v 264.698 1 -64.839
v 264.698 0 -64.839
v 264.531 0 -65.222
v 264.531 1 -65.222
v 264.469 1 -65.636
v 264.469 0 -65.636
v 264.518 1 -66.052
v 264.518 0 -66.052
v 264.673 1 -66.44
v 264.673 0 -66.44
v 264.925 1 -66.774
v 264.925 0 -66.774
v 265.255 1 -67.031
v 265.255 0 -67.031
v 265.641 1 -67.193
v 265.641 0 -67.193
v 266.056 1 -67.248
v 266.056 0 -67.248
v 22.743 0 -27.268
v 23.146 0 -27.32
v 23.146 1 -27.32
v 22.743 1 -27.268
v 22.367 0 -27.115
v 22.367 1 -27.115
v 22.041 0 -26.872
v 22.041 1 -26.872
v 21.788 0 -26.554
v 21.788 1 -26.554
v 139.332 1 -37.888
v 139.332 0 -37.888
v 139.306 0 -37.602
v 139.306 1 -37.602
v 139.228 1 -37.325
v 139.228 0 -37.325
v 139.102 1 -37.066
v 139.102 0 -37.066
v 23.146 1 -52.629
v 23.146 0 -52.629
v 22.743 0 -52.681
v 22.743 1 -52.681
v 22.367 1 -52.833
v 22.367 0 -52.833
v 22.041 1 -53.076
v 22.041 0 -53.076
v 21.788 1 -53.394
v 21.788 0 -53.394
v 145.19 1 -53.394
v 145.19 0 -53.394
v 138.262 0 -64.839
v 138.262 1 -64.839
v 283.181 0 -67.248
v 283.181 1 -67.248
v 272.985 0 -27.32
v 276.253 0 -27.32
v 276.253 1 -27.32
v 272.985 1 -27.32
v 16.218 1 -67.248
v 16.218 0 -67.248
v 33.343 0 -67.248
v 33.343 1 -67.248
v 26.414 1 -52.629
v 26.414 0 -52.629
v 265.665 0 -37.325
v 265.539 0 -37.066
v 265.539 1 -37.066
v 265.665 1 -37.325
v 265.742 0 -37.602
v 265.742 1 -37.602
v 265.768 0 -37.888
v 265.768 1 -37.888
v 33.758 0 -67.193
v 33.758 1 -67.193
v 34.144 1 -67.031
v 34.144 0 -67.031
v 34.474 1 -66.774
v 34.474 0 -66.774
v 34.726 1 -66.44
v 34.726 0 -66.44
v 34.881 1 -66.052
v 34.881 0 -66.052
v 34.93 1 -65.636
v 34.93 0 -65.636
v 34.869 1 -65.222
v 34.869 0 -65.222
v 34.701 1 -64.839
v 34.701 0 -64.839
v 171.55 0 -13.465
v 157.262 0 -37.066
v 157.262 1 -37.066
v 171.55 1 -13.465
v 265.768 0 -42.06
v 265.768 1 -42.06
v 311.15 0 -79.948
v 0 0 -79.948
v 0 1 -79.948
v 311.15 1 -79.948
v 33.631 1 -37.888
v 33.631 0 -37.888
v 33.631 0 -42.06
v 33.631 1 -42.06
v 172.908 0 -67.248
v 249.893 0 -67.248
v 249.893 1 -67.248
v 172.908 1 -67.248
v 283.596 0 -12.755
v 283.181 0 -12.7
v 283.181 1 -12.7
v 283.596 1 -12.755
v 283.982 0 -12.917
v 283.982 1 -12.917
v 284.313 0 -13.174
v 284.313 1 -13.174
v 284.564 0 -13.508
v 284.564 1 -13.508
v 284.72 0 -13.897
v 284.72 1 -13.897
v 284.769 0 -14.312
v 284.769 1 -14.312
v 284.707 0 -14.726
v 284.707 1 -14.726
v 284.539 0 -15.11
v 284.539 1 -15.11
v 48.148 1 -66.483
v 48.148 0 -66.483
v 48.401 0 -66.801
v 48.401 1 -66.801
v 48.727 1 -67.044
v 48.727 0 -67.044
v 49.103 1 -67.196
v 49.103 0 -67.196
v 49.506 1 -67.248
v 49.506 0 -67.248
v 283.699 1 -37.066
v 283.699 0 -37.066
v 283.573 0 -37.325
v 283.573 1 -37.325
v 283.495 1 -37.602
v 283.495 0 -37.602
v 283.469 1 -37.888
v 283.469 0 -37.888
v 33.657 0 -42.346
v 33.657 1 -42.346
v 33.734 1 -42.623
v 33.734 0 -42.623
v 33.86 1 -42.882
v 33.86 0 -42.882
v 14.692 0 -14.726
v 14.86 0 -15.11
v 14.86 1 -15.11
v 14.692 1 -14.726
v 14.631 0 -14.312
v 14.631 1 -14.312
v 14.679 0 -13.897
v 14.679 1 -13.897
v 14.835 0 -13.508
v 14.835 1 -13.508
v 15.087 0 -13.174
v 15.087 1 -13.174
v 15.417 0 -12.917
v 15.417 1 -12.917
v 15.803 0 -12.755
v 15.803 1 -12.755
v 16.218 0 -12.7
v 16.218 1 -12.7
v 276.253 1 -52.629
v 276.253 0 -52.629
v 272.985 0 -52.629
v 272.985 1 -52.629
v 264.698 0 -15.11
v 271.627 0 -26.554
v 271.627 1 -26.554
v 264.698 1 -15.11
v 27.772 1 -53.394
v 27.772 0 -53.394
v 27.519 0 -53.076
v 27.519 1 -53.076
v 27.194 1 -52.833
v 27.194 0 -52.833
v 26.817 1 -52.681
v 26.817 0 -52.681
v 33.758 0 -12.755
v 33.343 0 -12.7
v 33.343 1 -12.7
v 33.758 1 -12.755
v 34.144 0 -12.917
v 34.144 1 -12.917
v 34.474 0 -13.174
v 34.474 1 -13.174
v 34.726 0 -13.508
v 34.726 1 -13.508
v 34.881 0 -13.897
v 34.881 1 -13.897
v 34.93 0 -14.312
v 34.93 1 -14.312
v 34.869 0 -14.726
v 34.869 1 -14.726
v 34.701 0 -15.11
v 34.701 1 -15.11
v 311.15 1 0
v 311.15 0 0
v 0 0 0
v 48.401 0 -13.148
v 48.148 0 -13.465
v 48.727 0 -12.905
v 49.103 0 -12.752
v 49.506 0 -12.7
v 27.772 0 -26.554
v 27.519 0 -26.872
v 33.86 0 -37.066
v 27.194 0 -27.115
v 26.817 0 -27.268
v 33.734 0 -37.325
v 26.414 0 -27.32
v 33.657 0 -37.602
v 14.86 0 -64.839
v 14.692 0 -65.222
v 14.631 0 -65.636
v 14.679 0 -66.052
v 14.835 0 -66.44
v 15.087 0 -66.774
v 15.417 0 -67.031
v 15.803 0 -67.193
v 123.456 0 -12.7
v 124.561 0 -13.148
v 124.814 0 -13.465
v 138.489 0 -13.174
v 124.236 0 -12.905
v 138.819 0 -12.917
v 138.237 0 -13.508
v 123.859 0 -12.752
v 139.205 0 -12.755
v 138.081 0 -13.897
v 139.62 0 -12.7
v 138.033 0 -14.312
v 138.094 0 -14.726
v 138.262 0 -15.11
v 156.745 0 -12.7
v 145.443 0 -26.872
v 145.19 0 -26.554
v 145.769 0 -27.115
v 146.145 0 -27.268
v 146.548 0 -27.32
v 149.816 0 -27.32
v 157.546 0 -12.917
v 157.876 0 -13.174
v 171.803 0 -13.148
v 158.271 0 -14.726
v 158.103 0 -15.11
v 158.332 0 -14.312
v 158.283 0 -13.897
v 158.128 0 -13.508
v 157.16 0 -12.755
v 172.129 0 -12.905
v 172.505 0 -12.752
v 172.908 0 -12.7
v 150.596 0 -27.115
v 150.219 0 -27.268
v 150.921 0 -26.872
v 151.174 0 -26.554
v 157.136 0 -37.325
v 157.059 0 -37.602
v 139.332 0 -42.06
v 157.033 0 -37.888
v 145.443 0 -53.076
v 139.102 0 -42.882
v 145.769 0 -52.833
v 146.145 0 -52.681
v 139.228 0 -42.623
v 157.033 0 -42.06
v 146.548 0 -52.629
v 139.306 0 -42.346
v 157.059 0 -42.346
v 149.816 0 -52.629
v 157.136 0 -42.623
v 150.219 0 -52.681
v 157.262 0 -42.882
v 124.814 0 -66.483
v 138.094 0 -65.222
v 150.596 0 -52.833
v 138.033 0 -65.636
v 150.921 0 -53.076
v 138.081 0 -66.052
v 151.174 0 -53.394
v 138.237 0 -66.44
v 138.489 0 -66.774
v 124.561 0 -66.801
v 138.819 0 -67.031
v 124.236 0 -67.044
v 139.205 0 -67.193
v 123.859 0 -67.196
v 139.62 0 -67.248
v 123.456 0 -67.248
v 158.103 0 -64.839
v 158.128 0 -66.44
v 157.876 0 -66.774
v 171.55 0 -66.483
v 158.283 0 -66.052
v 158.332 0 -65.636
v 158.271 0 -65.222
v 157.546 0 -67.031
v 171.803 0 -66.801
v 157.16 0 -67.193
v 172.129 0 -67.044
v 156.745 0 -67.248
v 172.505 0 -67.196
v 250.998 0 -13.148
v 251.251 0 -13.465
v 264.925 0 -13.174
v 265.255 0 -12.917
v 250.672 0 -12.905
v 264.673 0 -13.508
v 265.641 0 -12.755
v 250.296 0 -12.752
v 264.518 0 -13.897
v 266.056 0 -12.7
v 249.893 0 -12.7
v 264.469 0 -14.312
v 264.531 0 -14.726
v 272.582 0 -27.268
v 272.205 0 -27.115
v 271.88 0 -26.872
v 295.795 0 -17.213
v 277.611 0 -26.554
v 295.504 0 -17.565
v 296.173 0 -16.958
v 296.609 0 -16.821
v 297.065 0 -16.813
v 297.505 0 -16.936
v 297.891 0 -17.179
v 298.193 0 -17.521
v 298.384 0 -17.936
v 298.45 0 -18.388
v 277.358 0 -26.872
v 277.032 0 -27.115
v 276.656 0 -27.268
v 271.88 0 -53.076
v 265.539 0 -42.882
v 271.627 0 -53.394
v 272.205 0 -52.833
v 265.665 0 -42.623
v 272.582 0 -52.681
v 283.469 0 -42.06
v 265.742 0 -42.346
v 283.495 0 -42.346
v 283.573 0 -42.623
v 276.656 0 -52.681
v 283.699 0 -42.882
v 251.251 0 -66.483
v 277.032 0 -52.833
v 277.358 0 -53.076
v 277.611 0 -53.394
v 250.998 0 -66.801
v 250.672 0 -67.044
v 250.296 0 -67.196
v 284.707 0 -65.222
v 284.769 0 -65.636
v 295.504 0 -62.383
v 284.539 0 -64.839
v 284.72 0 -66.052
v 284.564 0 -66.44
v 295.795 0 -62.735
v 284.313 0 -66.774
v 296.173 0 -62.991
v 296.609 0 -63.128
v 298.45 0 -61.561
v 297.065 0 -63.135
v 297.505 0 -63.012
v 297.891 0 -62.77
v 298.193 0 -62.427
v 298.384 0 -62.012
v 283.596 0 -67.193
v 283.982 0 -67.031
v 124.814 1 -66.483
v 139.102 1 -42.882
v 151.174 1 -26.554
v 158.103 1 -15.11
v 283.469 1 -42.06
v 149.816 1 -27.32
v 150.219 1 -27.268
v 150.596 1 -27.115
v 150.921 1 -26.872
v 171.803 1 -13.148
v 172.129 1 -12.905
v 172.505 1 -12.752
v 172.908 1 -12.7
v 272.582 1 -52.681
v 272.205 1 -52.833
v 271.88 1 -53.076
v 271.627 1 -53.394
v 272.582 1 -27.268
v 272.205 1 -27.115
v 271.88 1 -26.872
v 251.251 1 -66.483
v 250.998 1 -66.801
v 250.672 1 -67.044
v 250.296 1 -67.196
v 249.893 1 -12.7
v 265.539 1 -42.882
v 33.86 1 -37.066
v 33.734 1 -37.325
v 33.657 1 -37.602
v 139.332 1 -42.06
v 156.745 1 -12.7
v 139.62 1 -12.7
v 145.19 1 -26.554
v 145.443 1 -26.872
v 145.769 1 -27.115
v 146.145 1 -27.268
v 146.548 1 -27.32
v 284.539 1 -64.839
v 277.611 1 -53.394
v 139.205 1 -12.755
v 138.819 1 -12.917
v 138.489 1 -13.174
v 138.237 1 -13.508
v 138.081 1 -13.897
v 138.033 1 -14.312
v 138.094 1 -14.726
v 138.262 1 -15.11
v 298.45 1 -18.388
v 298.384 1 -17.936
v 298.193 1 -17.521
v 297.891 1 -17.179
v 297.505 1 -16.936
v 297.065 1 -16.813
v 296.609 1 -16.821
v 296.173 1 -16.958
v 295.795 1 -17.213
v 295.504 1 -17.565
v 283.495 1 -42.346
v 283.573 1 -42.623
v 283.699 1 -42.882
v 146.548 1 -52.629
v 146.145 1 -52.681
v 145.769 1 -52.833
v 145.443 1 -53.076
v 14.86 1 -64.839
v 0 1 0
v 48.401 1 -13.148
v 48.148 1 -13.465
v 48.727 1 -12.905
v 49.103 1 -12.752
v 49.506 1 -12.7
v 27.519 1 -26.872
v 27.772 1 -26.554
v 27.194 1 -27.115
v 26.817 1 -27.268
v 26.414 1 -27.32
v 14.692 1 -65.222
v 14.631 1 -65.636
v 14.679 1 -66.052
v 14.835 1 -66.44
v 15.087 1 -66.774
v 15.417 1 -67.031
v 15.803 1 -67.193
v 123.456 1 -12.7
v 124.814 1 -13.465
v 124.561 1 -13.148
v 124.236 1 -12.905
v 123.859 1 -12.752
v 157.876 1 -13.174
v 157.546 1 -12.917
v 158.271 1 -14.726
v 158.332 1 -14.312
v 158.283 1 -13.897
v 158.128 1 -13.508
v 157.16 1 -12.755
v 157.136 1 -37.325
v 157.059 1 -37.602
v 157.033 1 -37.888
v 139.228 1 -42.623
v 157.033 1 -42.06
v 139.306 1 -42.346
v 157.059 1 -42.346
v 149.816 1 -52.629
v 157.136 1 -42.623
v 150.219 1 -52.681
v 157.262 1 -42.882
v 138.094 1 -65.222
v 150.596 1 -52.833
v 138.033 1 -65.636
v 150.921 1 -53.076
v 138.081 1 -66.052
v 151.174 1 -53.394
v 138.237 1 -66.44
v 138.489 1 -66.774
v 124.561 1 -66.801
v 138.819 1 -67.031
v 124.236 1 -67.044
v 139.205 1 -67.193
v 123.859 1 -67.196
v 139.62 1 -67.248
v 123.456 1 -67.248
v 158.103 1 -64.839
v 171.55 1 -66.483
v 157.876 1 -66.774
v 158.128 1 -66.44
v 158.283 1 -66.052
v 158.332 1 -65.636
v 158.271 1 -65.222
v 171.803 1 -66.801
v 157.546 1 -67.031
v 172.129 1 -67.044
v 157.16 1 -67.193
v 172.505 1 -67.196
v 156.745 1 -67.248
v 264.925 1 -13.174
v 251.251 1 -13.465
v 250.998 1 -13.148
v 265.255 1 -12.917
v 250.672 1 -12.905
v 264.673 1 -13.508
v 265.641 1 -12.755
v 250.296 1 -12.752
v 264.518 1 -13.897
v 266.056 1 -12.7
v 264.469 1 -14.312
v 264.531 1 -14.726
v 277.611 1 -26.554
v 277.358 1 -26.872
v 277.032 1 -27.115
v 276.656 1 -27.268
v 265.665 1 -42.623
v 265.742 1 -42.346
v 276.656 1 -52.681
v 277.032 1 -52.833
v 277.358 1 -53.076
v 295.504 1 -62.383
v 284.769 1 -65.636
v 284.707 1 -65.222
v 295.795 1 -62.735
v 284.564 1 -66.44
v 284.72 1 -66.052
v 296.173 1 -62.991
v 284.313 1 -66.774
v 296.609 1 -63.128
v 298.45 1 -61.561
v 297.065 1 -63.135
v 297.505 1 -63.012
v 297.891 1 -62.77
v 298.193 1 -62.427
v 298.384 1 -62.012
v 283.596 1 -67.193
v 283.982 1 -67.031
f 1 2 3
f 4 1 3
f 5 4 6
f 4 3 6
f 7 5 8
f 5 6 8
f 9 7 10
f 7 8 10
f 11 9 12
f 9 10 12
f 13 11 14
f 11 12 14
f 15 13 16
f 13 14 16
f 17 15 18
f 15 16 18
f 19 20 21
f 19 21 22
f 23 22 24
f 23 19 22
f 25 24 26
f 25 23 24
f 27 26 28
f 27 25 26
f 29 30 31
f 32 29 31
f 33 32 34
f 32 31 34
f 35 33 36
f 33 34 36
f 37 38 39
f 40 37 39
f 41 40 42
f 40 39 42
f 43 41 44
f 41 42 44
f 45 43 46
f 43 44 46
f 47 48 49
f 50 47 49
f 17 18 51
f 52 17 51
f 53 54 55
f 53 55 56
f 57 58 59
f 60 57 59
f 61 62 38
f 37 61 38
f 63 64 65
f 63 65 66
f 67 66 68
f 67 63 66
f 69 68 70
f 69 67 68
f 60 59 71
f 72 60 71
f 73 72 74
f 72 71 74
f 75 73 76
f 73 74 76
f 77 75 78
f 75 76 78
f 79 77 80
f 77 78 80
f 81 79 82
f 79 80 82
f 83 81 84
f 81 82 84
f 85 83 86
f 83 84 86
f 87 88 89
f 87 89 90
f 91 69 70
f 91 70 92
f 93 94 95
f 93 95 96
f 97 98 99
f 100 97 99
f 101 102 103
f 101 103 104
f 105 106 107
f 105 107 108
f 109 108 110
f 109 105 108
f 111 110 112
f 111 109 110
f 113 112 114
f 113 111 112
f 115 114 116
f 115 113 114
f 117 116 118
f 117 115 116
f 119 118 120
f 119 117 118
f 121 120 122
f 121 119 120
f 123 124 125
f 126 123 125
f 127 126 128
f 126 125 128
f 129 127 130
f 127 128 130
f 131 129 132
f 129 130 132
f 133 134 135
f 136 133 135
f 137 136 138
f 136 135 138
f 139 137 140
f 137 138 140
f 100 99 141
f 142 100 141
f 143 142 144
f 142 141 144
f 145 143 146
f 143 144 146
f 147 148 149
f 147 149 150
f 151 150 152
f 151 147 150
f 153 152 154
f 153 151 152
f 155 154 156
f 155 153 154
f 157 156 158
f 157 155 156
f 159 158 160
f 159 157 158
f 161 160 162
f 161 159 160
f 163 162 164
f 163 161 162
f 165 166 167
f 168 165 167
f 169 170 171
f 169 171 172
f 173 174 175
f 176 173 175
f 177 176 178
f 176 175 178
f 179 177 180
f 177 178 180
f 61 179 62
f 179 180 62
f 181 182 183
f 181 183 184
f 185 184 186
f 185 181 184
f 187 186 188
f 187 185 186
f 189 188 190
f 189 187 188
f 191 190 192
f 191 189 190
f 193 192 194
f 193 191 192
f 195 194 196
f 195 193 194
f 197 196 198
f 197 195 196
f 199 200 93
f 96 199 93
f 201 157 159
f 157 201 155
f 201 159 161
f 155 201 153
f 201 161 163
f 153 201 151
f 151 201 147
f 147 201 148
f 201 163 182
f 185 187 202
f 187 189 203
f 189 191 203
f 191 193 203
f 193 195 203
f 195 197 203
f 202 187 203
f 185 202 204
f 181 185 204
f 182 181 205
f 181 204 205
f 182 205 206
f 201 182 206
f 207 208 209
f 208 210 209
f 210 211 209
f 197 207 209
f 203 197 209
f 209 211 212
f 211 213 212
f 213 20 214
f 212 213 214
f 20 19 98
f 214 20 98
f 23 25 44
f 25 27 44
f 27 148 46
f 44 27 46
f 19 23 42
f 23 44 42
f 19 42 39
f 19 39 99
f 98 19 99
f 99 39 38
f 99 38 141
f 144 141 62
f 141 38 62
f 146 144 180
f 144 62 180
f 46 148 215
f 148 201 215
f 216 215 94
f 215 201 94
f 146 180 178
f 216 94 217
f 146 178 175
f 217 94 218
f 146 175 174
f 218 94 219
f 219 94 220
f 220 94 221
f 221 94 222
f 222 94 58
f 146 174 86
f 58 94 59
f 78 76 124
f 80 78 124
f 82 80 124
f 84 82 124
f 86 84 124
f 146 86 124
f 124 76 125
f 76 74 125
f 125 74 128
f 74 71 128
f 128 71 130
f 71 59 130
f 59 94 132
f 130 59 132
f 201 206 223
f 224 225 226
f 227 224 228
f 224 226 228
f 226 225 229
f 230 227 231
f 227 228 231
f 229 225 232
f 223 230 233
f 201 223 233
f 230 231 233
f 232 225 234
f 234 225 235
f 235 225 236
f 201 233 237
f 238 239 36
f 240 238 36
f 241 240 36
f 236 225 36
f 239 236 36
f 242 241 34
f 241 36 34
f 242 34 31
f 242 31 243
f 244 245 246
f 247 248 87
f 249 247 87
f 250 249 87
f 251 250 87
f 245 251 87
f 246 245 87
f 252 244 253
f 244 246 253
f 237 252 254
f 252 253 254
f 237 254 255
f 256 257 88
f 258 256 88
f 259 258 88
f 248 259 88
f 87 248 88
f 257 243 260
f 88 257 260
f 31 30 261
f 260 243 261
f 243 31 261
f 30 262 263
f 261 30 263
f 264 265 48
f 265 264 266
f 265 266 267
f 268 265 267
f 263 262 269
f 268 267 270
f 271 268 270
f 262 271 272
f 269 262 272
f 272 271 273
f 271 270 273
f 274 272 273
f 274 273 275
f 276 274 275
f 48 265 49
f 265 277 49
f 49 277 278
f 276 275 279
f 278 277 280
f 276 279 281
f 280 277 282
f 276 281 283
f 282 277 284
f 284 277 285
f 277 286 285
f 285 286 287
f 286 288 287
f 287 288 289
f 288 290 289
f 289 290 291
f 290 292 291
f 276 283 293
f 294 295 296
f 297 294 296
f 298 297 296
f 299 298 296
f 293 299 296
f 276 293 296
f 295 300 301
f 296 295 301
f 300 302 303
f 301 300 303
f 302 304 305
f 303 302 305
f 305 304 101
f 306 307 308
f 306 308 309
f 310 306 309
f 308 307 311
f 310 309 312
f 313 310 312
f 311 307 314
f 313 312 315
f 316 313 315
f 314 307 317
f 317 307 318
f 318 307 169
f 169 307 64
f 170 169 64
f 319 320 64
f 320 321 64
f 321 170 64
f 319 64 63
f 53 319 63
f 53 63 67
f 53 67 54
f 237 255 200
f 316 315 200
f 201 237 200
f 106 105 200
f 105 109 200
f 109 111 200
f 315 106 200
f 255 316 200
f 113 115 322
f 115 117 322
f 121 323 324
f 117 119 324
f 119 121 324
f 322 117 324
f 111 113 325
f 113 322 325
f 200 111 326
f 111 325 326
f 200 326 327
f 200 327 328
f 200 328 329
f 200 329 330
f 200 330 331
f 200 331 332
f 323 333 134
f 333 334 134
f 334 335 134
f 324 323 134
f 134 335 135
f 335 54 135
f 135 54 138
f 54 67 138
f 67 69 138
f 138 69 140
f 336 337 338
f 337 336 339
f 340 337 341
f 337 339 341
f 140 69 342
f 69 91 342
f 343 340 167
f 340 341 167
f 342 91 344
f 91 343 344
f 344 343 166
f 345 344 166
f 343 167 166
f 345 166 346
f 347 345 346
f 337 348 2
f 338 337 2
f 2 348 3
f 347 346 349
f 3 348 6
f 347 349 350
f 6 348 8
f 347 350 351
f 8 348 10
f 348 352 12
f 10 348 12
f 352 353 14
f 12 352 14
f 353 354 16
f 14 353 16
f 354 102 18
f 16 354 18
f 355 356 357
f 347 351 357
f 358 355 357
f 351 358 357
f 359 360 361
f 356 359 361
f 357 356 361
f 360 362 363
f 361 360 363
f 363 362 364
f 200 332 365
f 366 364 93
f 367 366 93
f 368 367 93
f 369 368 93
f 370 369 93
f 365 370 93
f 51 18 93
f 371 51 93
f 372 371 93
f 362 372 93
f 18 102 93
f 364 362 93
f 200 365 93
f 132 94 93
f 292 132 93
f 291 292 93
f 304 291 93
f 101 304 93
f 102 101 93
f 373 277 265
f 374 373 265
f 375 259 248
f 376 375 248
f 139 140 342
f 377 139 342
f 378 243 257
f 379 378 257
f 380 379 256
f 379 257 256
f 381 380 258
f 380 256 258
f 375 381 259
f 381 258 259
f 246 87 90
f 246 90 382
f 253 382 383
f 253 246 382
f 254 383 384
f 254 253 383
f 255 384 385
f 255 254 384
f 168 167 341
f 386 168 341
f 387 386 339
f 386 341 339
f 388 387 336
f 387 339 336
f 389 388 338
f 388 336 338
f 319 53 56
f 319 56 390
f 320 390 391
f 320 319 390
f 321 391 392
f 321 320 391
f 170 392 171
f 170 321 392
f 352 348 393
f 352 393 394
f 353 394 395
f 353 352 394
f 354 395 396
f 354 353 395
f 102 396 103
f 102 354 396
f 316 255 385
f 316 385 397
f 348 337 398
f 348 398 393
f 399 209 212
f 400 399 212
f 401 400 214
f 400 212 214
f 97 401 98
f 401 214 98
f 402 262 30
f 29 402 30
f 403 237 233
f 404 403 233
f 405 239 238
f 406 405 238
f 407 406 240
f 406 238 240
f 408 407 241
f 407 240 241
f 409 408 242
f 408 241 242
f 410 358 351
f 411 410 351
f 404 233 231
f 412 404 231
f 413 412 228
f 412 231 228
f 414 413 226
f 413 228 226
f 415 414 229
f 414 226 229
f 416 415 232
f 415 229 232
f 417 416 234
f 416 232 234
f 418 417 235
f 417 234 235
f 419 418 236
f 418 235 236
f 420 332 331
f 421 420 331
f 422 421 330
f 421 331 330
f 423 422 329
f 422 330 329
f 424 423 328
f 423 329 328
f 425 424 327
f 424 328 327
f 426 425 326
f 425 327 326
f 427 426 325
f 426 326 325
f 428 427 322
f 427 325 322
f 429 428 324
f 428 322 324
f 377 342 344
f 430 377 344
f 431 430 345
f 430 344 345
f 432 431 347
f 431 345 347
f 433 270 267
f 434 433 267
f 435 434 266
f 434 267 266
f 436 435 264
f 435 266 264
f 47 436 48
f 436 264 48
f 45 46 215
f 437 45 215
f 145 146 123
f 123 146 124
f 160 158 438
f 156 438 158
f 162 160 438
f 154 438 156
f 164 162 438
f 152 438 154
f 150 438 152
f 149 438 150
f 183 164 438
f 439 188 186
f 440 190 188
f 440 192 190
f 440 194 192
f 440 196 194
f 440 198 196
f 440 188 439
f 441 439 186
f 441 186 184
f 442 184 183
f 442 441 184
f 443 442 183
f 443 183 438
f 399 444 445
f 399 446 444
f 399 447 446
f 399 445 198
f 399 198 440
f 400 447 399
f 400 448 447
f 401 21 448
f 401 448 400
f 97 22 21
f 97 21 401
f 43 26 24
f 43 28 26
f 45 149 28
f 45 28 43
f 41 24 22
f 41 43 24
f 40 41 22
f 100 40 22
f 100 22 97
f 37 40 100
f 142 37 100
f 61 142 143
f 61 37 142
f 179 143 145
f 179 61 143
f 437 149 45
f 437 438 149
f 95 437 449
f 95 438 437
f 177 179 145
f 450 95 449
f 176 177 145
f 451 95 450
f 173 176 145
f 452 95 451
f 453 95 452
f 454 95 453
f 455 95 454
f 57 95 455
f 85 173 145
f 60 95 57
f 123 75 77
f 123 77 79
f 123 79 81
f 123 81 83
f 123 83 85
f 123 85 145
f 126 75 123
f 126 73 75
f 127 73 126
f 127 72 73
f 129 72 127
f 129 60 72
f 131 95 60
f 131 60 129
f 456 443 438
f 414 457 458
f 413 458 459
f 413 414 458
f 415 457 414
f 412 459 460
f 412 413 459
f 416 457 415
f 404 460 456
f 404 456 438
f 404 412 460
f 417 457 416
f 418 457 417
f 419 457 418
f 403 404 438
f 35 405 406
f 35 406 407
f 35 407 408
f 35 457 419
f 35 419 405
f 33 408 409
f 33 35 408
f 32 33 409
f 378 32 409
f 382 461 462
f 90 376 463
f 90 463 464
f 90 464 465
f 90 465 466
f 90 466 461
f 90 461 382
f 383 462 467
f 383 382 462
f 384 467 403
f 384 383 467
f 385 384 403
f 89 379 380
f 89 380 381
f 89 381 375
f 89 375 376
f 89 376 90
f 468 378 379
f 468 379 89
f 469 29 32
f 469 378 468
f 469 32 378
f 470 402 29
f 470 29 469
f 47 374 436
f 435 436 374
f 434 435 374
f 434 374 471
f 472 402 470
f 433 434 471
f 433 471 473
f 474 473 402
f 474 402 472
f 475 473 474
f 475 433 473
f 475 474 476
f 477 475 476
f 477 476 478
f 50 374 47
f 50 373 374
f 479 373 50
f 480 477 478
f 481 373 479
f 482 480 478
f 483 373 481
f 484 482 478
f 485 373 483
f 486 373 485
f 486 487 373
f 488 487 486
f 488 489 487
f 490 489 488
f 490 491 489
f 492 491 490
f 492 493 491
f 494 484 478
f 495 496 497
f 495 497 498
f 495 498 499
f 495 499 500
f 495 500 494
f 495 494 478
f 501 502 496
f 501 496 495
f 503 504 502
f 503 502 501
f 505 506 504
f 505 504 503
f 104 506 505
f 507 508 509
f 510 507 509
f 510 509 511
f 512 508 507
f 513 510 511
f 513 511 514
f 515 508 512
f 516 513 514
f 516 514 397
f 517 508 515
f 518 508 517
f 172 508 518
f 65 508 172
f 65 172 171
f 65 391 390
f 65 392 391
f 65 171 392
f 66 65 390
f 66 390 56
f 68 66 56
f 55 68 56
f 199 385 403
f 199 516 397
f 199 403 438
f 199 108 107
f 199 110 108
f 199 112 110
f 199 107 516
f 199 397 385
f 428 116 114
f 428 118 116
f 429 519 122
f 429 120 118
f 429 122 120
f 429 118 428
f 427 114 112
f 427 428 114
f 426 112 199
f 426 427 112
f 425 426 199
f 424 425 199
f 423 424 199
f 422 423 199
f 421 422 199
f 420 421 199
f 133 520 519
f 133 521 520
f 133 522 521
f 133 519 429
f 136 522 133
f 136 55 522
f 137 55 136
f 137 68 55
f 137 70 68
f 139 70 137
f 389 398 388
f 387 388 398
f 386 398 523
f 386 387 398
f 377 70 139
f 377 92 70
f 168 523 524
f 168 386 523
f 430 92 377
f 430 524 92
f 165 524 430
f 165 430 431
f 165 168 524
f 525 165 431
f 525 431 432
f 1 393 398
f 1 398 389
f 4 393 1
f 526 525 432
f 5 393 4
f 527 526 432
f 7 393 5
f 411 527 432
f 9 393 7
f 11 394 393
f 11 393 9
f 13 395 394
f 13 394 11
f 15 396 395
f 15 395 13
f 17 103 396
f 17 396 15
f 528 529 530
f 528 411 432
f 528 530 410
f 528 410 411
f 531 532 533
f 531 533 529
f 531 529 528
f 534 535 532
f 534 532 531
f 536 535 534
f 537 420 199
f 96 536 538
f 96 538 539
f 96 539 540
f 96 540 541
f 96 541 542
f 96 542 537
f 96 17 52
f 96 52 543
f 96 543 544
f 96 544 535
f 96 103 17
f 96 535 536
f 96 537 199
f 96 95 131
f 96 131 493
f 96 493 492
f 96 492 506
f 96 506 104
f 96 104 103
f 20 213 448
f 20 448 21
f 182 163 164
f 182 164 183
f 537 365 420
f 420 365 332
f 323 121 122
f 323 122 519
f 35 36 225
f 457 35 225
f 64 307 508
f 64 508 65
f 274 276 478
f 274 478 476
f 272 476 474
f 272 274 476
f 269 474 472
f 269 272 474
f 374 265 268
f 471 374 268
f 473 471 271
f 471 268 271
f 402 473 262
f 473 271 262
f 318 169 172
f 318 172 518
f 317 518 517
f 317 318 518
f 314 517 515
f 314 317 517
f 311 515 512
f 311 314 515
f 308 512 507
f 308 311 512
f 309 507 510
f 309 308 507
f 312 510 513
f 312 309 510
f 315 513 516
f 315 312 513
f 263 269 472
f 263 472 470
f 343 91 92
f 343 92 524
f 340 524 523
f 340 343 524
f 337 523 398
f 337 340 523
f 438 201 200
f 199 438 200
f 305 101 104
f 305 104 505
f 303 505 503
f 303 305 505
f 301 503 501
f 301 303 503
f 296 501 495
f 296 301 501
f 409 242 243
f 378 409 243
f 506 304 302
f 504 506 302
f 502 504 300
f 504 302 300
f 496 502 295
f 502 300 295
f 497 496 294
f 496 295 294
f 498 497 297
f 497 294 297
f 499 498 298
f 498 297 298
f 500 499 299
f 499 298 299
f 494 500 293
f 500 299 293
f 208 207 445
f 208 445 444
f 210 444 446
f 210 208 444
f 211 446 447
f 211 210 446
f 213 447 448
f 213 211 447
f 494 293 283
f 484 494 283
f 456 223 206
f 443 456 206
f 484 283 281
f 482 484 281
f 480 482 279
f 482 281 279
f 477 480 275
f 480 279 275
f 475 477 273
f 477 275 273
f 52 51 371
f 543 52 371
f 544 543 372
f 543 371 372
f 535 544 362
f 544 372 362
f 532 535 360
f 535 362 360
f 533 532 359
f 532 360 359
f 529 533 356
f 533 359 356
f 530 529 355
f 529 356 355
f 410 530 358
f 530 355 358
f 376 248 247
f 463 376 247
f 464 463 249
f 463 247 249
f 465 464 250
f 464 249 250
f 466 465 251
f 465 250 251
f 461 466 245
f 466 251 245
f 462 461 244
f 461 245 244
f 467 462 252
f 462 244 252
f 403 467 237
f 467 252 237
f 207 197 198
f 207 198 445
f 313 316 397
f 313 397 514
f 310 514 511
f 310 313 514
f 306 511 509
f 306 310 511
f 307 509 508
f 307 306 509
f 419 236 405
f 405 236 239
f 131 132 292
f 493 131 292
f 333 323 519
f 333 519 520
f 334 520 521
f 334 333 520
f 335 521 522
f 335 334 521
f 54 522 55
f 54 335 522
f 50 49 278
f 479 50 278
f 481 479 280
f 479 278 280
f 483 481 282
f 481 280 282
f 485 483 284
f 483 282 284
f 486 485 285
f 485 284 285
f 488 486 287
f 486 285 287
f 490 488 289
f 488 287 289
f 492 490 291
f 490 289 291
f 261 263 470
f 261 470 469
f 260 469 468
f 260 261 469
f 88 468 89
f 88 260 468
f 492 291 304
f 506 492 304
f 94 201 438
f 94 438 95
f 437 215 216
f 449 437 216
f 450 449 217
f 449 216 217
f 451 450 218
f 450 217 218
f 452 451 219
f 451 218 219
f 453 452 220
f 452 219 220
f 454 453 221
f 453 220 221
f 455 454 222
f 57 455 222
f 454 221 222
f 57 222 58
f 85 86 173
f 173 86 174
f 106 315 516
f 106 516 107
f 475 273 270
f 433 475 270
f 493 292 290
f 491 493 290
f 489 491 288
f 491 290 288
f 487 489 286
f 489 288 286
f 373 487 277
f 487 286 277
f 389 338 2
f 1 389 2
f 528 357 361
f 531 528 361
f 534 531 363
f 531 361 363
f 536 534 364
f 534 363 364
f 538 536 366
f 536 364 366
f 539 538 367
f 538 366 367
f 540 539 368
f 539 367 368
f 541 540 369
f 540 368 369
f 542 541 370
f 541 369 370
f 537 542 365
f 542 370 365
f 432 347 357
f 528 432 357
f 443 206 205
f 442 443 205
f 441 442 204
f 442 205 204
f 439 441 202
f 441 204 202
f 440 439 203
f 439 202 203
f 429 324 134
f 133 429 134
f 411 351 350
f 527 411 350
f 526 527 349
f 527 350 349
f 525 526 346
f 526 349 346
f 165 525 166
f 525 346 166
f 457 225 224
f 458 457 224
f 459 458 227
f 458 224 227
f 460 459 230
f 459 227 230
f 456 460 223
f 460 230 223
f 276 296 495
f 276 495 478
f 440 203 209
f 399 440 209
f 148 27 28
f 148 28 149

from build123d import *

# Parameters (mm, degrees)
SKETCH1_W           = 311.15
SKETCH1_H           = 79.948192099
BOSS_EXTRUDE1_DEPTH = 1


with BuildPart() as part:
    # Sketch1 → Boss-Extrude1 (new body)
    with BuildSketch(Plane(origin=(0, 0, 0), x_dir=(1, 0, 0), z_dir=(0, 1, 0))):
        with Locations((155.575, 39.97409605)):
            Rectangle(SKETCH1_W, SKETCH1_H)
        with BuildLine():
            Line((16.217864357, 67.248192099), (33.342821045, 67.248192099))
            ThreePointArc((33.342821045, 67.248192099), (34.725807369, 66.44011822), (34.70085023, 64.838552828))
            Line((34.70085023, 64.838552828), (27.77241501, 53.39399889))
            ThreePointArc((27.77241501, 53.39399889), (27.193811945, 52.833151838), (26.414385824, 52.628638162))
            Line((26.414385824, 52.628638162), (23.146299578, 52.628638162))
            ThreePointArc((23.146299578, 52.628638162), (22.366873457, 52.833151838), (21.788270393, 53.39399889))
            Line((21.788270393, 53.39399889), (14.859835172, 64.838552828))
            ThreePointArc((14.859835172, 64.838552828), (14.834878034, 66.44011822), (16.217864357, 67.248192099))
        make_face(mode=Mode.SUBTRACT)
        with BuildLine():
            Line((49.506215761, 67.248192099), (123.456467253, 67.248192099))
            ThreePointArc((123.456467253, 67.248192099), (124.235893374, 67.043678423), (124.814496439, 66.482831371))
            Line((124.814496439, 66.482831371), (139.102316391, 42.881870854))
            ThreePointArc((139.102316391, 42.881870854), (139.273343709, 42.486513094), (139.331787206, 42.059731582))
            Line((139.331787206, 42.059731582), (139.331787206, 37.888460517))
            ThreePointArc((139.331787206, 37.888460517), (139.273343709, 37.461679005), (139.102316391, 37.066321246))
            Line((139.102316391, 37.066321246), (124.814496439, 13.465360728))
            ThreePointArc((124.814496439, 13.465360728), (124.235893374, 12.904513676), (123.456467253, 12.7))
            Line((123.456467253, 12.7), (49.506215761, 12.7))
            ThreePointArc((49.506215761, 12.7), (48.72678964, 12.904513676), (48.148186576, 13.465360728))
            Line((48.148186576, 13.465360728), (33.860366623, 37.066321246))
            ThreePointArc((33.860366623, 37.066321246), (33.689339305, 37.461679005), (33.630895809, 37.888460517))
            Line((33.630895809, 37.888460517), (33.630895809, 42.059731582))
            ThreePointArc((33.630895809, 42.059731582), (33.689339305, 42.486513094), (33.860366623, 42.881870854))
            Line((33.860366623, 42.881870854), (48.148186576, 66.482831371))
            ThreePointArc((48.148186576, 66.482831371), (48.72678964, 67.043678423), (49.506215761, 67.248192099))
        make_face(mode=Mode.SUBTRACT)
        with BuildLine():
            Line((266.056334932, 67.248192099), (283.18129162, 67.248192099))
            ThreePointArc((283.18129162, 67.248192099), (284.564277944, 66.44011822), (284.539320806, 64.838552828))
            Line((284.539320806, 64.838552828), (277.610885585, 53.39399889))
            ThreePointArc((277.610885585, 53.39399889), (277.03228252, 52.833151838), (276.252856399, 52.628638162))
            Line((276.252856399, 52.628638162), (272.984770153, 52.628638162))
            ThreePointArc((272.984770153, 52.628638162), (272.205344032, 52.833151838), (271.626740968, 53.39399889))
            Line((271.626740968, 53.39399889), (264.698305747, 64.838552828))
            ThreePointArc((264.698305747, 64.838552828), (264.673348609, 66.44011822), (266.056334932, 67.248192099))
        make_face(mode=Mode.SUBTRACT)
        with BuildLine():
            Line((16.217864357, 12.7), (33.342821045, 12.7))
            ThreePointArc((33.342821045, 12.7), (34.725807369, 13.508073879), (34.70085023, 15.109639272))
            Line((34.70085023, 15.109639272), (27.77241501, 26.554193209))
            ThreePointArc((27.77241501, 26.554193209), (27.193811945, 27.115040261), (26.414385824, 27.319553938))
            Line((26.414385824, 27.319553938), (23.146299578, 27.319553938))
            ThreePointArc((23.146299578, 27.319553938), (22.366873457, 27.115040261), (21.788270393, 26.554193209))
            Line((21.788270393, 26.554193209), (14.859835172, 15.109639272))
            ThreePointArc((14.859835172, 15.109639272), (14.834878034, 13.508073879), (16.217864357, 12.7))
        make_face(mode=Mode.SUBTRACT)
        with BuildLine():
            Line((139.619861969, 67.248192099), (156.744818657, 67.248192099))
            ThreePointArc((156.744818657, 67.248192099), (158.127804981, 66.44011822), (158.102847842, 64.838552828))
            Line((158.102847842, 64.838552828), (151.174412622, 53.39399889))
            ThreePointArc((151.174412622, 53.39399889), (150.595809557, 52.833151838), (149.816383436, 52.628638162))
            Line((149.816383436, 52.628638162), (146.54829719, 52.628638162))
            ThreePointArc((146.54829719, 52.628638162), (145.768871069, 52.833151838), (145.190268005, 53.39399889))
            Line((145.190268005, 53.39399889), (138.261832784, 64.838552828))
            ThreePointArc((138.261832784, 64.838552828), (138.236875646, 66.44011822), (139.619861969, 67.248192099))
        make_face(mode=Mode.SUBTRACT)
        with BuildLine():
            Line((298.45, 61.560557725), (298.45, 18.387634374))
            ThreePointArc((298.45, 18.387634374), (297.289281512, 16.858577871), (295.504470815, 17.565495103))
            Line((295.504470815, 17.565495103), (283.698837199, 37.066321246))
            ThreePointArc((283.698837199, 37.066321246), (283.52780988, 37.461679005), (283.469366384, 37.888460517))
            Line((283.469366384, 37.888460517), (283.469366384, 42.059731582))
            ThreePointArc((283.469366384, 42.059731582), (283.52780988, 42.486513094), (283.698837199, 42.881870854))
            Line((283.698837199, 42.881870854), (295.504470815, 62.382696997))
            ThreePointArc((295.504470815, 62.382696997), (297.289281512, 63.089614229), (298.45, 61.560557725))
        make_face(mode=Mode.SUBTRACT)
        with BuildLine():
            Line((265.768260169, 37.888460517), (265.768260169, 42.059731582))
            ThreePointArc((265.768260169, 42.059731582), (265.709816672, 42.486513094), (265.538789354, 42.881870854))
            Line((265.538789354, 42.881870854), (251.250969402, 66.482831371))
            ThreePointArc((251.250969402, 66.482831371), (250.672366338, 67.043678423), (249.892940217, 67.248192099))
            Line((249.892940217, 67.248192099), (172.908213373, 67.248192099))
            ThreePointArc((172.908213373, 67.248192099), (172.128787252, 67.043678423), (171.550184188, 66.482831371))
            Line((171.550184188, 66.482831371), (157.262364235, 42.881870854))
            ThreePointArc((157.262364235, 42.881870854), (157.091336917, 42.486513094), (157.032893421, 42.059731582))
            Line((157.032893421, 42.059731582), (157.032893421, 37.888460517))
            ThreePointArc((157.032893421, 37.888460517), (157.091336917, 37.461679005), (157.262364235, 37.066321246))
            Line((157.262364235, 37.066321246), (171.550184188, 13.465360728))
            ThreePointArc((171.550184188, 13.465360728), (172.128787252, 12.904513676), (172.908213373, 12.7))
            Line((172.908213373, 12.7), (249.892940217, 12.7))
            ThreePointArc((249.892940217, 12.7), (250.672366338, 12.904513676), (251.250969402, 13.465360728))
            Line((251.250969402, 13.465360728), (265.538789354, 37.066321246))
            ThreePointArc((265.538789354, 37.066321246), (265.709816672, 37.461679005), (265.768260169, 37.888460517))
        make_face(mode=Mode.SUBTRACT)
        with BuildLine():
            Line((146.54829719, 27.319553938), (149.816383436, 27.319553938))
            ThreePointArc((149.816383436, 27.319553938), (150.595809557, 27.115040261), (151.174412622, 26.554193209))
            Line((151.174412622, 26.554193209), (158.102847842, 15.109639272))
            ThreePointArc((158.102847842, 15.109639272), (158.127804981, 13.508073879), (156.744818657, 12.7))
            Line((156.744818657, 12.7), (139.619861969, 12.7))
            ThreePointArc((139.619861969, 12.7), (138.236875646, 13.508073879), (138.261832784, 15.109639272))
            Line((138.261832784, 15.109639272), (145.190268005, 26.554193209))
            ThreePointArc((145.190268005, 26.554193209), (145.768871069, 27.115040261), (146.54829719, 27.319553938))
        make_face(mode=Mode.SUBTRACT)
        with BuildLine():
            Line((271.626740968, 26.554193209), (264.698305747, 15.109639272))
            ThreePointArc((264.698305747, 15.109639272), (264.673348609, 13.508073879), (266.056334932, 12.7))
            Line((266.056334932, 12.7), (283.18129162, 12.7))
            ThreePointArc((283.18129162, 12.7), (284.564277944, 13.508073879), (284.539320806, 15.109639272))
            Line((284.539320806, 15.109639272), (277.610885585, 26.554193209))
            ThreePointArc((277.610885585, 26.554193209), (277.03228252, 27.115040261), (276.252856399, 27.319553938))
            Line((276.252856399, 27.319553938), (272.984770153, 27.319553938))
            ThreePointArc((272.984770153, 27.319553938), (272.205344032, 27.115040261), (271.626740968, 26.554193209))
        make_face(mode=Mode.SUBTRACT)
    extrude(amount=BOSS_EXTRUDE1_DEPTH)


solid = part.part
